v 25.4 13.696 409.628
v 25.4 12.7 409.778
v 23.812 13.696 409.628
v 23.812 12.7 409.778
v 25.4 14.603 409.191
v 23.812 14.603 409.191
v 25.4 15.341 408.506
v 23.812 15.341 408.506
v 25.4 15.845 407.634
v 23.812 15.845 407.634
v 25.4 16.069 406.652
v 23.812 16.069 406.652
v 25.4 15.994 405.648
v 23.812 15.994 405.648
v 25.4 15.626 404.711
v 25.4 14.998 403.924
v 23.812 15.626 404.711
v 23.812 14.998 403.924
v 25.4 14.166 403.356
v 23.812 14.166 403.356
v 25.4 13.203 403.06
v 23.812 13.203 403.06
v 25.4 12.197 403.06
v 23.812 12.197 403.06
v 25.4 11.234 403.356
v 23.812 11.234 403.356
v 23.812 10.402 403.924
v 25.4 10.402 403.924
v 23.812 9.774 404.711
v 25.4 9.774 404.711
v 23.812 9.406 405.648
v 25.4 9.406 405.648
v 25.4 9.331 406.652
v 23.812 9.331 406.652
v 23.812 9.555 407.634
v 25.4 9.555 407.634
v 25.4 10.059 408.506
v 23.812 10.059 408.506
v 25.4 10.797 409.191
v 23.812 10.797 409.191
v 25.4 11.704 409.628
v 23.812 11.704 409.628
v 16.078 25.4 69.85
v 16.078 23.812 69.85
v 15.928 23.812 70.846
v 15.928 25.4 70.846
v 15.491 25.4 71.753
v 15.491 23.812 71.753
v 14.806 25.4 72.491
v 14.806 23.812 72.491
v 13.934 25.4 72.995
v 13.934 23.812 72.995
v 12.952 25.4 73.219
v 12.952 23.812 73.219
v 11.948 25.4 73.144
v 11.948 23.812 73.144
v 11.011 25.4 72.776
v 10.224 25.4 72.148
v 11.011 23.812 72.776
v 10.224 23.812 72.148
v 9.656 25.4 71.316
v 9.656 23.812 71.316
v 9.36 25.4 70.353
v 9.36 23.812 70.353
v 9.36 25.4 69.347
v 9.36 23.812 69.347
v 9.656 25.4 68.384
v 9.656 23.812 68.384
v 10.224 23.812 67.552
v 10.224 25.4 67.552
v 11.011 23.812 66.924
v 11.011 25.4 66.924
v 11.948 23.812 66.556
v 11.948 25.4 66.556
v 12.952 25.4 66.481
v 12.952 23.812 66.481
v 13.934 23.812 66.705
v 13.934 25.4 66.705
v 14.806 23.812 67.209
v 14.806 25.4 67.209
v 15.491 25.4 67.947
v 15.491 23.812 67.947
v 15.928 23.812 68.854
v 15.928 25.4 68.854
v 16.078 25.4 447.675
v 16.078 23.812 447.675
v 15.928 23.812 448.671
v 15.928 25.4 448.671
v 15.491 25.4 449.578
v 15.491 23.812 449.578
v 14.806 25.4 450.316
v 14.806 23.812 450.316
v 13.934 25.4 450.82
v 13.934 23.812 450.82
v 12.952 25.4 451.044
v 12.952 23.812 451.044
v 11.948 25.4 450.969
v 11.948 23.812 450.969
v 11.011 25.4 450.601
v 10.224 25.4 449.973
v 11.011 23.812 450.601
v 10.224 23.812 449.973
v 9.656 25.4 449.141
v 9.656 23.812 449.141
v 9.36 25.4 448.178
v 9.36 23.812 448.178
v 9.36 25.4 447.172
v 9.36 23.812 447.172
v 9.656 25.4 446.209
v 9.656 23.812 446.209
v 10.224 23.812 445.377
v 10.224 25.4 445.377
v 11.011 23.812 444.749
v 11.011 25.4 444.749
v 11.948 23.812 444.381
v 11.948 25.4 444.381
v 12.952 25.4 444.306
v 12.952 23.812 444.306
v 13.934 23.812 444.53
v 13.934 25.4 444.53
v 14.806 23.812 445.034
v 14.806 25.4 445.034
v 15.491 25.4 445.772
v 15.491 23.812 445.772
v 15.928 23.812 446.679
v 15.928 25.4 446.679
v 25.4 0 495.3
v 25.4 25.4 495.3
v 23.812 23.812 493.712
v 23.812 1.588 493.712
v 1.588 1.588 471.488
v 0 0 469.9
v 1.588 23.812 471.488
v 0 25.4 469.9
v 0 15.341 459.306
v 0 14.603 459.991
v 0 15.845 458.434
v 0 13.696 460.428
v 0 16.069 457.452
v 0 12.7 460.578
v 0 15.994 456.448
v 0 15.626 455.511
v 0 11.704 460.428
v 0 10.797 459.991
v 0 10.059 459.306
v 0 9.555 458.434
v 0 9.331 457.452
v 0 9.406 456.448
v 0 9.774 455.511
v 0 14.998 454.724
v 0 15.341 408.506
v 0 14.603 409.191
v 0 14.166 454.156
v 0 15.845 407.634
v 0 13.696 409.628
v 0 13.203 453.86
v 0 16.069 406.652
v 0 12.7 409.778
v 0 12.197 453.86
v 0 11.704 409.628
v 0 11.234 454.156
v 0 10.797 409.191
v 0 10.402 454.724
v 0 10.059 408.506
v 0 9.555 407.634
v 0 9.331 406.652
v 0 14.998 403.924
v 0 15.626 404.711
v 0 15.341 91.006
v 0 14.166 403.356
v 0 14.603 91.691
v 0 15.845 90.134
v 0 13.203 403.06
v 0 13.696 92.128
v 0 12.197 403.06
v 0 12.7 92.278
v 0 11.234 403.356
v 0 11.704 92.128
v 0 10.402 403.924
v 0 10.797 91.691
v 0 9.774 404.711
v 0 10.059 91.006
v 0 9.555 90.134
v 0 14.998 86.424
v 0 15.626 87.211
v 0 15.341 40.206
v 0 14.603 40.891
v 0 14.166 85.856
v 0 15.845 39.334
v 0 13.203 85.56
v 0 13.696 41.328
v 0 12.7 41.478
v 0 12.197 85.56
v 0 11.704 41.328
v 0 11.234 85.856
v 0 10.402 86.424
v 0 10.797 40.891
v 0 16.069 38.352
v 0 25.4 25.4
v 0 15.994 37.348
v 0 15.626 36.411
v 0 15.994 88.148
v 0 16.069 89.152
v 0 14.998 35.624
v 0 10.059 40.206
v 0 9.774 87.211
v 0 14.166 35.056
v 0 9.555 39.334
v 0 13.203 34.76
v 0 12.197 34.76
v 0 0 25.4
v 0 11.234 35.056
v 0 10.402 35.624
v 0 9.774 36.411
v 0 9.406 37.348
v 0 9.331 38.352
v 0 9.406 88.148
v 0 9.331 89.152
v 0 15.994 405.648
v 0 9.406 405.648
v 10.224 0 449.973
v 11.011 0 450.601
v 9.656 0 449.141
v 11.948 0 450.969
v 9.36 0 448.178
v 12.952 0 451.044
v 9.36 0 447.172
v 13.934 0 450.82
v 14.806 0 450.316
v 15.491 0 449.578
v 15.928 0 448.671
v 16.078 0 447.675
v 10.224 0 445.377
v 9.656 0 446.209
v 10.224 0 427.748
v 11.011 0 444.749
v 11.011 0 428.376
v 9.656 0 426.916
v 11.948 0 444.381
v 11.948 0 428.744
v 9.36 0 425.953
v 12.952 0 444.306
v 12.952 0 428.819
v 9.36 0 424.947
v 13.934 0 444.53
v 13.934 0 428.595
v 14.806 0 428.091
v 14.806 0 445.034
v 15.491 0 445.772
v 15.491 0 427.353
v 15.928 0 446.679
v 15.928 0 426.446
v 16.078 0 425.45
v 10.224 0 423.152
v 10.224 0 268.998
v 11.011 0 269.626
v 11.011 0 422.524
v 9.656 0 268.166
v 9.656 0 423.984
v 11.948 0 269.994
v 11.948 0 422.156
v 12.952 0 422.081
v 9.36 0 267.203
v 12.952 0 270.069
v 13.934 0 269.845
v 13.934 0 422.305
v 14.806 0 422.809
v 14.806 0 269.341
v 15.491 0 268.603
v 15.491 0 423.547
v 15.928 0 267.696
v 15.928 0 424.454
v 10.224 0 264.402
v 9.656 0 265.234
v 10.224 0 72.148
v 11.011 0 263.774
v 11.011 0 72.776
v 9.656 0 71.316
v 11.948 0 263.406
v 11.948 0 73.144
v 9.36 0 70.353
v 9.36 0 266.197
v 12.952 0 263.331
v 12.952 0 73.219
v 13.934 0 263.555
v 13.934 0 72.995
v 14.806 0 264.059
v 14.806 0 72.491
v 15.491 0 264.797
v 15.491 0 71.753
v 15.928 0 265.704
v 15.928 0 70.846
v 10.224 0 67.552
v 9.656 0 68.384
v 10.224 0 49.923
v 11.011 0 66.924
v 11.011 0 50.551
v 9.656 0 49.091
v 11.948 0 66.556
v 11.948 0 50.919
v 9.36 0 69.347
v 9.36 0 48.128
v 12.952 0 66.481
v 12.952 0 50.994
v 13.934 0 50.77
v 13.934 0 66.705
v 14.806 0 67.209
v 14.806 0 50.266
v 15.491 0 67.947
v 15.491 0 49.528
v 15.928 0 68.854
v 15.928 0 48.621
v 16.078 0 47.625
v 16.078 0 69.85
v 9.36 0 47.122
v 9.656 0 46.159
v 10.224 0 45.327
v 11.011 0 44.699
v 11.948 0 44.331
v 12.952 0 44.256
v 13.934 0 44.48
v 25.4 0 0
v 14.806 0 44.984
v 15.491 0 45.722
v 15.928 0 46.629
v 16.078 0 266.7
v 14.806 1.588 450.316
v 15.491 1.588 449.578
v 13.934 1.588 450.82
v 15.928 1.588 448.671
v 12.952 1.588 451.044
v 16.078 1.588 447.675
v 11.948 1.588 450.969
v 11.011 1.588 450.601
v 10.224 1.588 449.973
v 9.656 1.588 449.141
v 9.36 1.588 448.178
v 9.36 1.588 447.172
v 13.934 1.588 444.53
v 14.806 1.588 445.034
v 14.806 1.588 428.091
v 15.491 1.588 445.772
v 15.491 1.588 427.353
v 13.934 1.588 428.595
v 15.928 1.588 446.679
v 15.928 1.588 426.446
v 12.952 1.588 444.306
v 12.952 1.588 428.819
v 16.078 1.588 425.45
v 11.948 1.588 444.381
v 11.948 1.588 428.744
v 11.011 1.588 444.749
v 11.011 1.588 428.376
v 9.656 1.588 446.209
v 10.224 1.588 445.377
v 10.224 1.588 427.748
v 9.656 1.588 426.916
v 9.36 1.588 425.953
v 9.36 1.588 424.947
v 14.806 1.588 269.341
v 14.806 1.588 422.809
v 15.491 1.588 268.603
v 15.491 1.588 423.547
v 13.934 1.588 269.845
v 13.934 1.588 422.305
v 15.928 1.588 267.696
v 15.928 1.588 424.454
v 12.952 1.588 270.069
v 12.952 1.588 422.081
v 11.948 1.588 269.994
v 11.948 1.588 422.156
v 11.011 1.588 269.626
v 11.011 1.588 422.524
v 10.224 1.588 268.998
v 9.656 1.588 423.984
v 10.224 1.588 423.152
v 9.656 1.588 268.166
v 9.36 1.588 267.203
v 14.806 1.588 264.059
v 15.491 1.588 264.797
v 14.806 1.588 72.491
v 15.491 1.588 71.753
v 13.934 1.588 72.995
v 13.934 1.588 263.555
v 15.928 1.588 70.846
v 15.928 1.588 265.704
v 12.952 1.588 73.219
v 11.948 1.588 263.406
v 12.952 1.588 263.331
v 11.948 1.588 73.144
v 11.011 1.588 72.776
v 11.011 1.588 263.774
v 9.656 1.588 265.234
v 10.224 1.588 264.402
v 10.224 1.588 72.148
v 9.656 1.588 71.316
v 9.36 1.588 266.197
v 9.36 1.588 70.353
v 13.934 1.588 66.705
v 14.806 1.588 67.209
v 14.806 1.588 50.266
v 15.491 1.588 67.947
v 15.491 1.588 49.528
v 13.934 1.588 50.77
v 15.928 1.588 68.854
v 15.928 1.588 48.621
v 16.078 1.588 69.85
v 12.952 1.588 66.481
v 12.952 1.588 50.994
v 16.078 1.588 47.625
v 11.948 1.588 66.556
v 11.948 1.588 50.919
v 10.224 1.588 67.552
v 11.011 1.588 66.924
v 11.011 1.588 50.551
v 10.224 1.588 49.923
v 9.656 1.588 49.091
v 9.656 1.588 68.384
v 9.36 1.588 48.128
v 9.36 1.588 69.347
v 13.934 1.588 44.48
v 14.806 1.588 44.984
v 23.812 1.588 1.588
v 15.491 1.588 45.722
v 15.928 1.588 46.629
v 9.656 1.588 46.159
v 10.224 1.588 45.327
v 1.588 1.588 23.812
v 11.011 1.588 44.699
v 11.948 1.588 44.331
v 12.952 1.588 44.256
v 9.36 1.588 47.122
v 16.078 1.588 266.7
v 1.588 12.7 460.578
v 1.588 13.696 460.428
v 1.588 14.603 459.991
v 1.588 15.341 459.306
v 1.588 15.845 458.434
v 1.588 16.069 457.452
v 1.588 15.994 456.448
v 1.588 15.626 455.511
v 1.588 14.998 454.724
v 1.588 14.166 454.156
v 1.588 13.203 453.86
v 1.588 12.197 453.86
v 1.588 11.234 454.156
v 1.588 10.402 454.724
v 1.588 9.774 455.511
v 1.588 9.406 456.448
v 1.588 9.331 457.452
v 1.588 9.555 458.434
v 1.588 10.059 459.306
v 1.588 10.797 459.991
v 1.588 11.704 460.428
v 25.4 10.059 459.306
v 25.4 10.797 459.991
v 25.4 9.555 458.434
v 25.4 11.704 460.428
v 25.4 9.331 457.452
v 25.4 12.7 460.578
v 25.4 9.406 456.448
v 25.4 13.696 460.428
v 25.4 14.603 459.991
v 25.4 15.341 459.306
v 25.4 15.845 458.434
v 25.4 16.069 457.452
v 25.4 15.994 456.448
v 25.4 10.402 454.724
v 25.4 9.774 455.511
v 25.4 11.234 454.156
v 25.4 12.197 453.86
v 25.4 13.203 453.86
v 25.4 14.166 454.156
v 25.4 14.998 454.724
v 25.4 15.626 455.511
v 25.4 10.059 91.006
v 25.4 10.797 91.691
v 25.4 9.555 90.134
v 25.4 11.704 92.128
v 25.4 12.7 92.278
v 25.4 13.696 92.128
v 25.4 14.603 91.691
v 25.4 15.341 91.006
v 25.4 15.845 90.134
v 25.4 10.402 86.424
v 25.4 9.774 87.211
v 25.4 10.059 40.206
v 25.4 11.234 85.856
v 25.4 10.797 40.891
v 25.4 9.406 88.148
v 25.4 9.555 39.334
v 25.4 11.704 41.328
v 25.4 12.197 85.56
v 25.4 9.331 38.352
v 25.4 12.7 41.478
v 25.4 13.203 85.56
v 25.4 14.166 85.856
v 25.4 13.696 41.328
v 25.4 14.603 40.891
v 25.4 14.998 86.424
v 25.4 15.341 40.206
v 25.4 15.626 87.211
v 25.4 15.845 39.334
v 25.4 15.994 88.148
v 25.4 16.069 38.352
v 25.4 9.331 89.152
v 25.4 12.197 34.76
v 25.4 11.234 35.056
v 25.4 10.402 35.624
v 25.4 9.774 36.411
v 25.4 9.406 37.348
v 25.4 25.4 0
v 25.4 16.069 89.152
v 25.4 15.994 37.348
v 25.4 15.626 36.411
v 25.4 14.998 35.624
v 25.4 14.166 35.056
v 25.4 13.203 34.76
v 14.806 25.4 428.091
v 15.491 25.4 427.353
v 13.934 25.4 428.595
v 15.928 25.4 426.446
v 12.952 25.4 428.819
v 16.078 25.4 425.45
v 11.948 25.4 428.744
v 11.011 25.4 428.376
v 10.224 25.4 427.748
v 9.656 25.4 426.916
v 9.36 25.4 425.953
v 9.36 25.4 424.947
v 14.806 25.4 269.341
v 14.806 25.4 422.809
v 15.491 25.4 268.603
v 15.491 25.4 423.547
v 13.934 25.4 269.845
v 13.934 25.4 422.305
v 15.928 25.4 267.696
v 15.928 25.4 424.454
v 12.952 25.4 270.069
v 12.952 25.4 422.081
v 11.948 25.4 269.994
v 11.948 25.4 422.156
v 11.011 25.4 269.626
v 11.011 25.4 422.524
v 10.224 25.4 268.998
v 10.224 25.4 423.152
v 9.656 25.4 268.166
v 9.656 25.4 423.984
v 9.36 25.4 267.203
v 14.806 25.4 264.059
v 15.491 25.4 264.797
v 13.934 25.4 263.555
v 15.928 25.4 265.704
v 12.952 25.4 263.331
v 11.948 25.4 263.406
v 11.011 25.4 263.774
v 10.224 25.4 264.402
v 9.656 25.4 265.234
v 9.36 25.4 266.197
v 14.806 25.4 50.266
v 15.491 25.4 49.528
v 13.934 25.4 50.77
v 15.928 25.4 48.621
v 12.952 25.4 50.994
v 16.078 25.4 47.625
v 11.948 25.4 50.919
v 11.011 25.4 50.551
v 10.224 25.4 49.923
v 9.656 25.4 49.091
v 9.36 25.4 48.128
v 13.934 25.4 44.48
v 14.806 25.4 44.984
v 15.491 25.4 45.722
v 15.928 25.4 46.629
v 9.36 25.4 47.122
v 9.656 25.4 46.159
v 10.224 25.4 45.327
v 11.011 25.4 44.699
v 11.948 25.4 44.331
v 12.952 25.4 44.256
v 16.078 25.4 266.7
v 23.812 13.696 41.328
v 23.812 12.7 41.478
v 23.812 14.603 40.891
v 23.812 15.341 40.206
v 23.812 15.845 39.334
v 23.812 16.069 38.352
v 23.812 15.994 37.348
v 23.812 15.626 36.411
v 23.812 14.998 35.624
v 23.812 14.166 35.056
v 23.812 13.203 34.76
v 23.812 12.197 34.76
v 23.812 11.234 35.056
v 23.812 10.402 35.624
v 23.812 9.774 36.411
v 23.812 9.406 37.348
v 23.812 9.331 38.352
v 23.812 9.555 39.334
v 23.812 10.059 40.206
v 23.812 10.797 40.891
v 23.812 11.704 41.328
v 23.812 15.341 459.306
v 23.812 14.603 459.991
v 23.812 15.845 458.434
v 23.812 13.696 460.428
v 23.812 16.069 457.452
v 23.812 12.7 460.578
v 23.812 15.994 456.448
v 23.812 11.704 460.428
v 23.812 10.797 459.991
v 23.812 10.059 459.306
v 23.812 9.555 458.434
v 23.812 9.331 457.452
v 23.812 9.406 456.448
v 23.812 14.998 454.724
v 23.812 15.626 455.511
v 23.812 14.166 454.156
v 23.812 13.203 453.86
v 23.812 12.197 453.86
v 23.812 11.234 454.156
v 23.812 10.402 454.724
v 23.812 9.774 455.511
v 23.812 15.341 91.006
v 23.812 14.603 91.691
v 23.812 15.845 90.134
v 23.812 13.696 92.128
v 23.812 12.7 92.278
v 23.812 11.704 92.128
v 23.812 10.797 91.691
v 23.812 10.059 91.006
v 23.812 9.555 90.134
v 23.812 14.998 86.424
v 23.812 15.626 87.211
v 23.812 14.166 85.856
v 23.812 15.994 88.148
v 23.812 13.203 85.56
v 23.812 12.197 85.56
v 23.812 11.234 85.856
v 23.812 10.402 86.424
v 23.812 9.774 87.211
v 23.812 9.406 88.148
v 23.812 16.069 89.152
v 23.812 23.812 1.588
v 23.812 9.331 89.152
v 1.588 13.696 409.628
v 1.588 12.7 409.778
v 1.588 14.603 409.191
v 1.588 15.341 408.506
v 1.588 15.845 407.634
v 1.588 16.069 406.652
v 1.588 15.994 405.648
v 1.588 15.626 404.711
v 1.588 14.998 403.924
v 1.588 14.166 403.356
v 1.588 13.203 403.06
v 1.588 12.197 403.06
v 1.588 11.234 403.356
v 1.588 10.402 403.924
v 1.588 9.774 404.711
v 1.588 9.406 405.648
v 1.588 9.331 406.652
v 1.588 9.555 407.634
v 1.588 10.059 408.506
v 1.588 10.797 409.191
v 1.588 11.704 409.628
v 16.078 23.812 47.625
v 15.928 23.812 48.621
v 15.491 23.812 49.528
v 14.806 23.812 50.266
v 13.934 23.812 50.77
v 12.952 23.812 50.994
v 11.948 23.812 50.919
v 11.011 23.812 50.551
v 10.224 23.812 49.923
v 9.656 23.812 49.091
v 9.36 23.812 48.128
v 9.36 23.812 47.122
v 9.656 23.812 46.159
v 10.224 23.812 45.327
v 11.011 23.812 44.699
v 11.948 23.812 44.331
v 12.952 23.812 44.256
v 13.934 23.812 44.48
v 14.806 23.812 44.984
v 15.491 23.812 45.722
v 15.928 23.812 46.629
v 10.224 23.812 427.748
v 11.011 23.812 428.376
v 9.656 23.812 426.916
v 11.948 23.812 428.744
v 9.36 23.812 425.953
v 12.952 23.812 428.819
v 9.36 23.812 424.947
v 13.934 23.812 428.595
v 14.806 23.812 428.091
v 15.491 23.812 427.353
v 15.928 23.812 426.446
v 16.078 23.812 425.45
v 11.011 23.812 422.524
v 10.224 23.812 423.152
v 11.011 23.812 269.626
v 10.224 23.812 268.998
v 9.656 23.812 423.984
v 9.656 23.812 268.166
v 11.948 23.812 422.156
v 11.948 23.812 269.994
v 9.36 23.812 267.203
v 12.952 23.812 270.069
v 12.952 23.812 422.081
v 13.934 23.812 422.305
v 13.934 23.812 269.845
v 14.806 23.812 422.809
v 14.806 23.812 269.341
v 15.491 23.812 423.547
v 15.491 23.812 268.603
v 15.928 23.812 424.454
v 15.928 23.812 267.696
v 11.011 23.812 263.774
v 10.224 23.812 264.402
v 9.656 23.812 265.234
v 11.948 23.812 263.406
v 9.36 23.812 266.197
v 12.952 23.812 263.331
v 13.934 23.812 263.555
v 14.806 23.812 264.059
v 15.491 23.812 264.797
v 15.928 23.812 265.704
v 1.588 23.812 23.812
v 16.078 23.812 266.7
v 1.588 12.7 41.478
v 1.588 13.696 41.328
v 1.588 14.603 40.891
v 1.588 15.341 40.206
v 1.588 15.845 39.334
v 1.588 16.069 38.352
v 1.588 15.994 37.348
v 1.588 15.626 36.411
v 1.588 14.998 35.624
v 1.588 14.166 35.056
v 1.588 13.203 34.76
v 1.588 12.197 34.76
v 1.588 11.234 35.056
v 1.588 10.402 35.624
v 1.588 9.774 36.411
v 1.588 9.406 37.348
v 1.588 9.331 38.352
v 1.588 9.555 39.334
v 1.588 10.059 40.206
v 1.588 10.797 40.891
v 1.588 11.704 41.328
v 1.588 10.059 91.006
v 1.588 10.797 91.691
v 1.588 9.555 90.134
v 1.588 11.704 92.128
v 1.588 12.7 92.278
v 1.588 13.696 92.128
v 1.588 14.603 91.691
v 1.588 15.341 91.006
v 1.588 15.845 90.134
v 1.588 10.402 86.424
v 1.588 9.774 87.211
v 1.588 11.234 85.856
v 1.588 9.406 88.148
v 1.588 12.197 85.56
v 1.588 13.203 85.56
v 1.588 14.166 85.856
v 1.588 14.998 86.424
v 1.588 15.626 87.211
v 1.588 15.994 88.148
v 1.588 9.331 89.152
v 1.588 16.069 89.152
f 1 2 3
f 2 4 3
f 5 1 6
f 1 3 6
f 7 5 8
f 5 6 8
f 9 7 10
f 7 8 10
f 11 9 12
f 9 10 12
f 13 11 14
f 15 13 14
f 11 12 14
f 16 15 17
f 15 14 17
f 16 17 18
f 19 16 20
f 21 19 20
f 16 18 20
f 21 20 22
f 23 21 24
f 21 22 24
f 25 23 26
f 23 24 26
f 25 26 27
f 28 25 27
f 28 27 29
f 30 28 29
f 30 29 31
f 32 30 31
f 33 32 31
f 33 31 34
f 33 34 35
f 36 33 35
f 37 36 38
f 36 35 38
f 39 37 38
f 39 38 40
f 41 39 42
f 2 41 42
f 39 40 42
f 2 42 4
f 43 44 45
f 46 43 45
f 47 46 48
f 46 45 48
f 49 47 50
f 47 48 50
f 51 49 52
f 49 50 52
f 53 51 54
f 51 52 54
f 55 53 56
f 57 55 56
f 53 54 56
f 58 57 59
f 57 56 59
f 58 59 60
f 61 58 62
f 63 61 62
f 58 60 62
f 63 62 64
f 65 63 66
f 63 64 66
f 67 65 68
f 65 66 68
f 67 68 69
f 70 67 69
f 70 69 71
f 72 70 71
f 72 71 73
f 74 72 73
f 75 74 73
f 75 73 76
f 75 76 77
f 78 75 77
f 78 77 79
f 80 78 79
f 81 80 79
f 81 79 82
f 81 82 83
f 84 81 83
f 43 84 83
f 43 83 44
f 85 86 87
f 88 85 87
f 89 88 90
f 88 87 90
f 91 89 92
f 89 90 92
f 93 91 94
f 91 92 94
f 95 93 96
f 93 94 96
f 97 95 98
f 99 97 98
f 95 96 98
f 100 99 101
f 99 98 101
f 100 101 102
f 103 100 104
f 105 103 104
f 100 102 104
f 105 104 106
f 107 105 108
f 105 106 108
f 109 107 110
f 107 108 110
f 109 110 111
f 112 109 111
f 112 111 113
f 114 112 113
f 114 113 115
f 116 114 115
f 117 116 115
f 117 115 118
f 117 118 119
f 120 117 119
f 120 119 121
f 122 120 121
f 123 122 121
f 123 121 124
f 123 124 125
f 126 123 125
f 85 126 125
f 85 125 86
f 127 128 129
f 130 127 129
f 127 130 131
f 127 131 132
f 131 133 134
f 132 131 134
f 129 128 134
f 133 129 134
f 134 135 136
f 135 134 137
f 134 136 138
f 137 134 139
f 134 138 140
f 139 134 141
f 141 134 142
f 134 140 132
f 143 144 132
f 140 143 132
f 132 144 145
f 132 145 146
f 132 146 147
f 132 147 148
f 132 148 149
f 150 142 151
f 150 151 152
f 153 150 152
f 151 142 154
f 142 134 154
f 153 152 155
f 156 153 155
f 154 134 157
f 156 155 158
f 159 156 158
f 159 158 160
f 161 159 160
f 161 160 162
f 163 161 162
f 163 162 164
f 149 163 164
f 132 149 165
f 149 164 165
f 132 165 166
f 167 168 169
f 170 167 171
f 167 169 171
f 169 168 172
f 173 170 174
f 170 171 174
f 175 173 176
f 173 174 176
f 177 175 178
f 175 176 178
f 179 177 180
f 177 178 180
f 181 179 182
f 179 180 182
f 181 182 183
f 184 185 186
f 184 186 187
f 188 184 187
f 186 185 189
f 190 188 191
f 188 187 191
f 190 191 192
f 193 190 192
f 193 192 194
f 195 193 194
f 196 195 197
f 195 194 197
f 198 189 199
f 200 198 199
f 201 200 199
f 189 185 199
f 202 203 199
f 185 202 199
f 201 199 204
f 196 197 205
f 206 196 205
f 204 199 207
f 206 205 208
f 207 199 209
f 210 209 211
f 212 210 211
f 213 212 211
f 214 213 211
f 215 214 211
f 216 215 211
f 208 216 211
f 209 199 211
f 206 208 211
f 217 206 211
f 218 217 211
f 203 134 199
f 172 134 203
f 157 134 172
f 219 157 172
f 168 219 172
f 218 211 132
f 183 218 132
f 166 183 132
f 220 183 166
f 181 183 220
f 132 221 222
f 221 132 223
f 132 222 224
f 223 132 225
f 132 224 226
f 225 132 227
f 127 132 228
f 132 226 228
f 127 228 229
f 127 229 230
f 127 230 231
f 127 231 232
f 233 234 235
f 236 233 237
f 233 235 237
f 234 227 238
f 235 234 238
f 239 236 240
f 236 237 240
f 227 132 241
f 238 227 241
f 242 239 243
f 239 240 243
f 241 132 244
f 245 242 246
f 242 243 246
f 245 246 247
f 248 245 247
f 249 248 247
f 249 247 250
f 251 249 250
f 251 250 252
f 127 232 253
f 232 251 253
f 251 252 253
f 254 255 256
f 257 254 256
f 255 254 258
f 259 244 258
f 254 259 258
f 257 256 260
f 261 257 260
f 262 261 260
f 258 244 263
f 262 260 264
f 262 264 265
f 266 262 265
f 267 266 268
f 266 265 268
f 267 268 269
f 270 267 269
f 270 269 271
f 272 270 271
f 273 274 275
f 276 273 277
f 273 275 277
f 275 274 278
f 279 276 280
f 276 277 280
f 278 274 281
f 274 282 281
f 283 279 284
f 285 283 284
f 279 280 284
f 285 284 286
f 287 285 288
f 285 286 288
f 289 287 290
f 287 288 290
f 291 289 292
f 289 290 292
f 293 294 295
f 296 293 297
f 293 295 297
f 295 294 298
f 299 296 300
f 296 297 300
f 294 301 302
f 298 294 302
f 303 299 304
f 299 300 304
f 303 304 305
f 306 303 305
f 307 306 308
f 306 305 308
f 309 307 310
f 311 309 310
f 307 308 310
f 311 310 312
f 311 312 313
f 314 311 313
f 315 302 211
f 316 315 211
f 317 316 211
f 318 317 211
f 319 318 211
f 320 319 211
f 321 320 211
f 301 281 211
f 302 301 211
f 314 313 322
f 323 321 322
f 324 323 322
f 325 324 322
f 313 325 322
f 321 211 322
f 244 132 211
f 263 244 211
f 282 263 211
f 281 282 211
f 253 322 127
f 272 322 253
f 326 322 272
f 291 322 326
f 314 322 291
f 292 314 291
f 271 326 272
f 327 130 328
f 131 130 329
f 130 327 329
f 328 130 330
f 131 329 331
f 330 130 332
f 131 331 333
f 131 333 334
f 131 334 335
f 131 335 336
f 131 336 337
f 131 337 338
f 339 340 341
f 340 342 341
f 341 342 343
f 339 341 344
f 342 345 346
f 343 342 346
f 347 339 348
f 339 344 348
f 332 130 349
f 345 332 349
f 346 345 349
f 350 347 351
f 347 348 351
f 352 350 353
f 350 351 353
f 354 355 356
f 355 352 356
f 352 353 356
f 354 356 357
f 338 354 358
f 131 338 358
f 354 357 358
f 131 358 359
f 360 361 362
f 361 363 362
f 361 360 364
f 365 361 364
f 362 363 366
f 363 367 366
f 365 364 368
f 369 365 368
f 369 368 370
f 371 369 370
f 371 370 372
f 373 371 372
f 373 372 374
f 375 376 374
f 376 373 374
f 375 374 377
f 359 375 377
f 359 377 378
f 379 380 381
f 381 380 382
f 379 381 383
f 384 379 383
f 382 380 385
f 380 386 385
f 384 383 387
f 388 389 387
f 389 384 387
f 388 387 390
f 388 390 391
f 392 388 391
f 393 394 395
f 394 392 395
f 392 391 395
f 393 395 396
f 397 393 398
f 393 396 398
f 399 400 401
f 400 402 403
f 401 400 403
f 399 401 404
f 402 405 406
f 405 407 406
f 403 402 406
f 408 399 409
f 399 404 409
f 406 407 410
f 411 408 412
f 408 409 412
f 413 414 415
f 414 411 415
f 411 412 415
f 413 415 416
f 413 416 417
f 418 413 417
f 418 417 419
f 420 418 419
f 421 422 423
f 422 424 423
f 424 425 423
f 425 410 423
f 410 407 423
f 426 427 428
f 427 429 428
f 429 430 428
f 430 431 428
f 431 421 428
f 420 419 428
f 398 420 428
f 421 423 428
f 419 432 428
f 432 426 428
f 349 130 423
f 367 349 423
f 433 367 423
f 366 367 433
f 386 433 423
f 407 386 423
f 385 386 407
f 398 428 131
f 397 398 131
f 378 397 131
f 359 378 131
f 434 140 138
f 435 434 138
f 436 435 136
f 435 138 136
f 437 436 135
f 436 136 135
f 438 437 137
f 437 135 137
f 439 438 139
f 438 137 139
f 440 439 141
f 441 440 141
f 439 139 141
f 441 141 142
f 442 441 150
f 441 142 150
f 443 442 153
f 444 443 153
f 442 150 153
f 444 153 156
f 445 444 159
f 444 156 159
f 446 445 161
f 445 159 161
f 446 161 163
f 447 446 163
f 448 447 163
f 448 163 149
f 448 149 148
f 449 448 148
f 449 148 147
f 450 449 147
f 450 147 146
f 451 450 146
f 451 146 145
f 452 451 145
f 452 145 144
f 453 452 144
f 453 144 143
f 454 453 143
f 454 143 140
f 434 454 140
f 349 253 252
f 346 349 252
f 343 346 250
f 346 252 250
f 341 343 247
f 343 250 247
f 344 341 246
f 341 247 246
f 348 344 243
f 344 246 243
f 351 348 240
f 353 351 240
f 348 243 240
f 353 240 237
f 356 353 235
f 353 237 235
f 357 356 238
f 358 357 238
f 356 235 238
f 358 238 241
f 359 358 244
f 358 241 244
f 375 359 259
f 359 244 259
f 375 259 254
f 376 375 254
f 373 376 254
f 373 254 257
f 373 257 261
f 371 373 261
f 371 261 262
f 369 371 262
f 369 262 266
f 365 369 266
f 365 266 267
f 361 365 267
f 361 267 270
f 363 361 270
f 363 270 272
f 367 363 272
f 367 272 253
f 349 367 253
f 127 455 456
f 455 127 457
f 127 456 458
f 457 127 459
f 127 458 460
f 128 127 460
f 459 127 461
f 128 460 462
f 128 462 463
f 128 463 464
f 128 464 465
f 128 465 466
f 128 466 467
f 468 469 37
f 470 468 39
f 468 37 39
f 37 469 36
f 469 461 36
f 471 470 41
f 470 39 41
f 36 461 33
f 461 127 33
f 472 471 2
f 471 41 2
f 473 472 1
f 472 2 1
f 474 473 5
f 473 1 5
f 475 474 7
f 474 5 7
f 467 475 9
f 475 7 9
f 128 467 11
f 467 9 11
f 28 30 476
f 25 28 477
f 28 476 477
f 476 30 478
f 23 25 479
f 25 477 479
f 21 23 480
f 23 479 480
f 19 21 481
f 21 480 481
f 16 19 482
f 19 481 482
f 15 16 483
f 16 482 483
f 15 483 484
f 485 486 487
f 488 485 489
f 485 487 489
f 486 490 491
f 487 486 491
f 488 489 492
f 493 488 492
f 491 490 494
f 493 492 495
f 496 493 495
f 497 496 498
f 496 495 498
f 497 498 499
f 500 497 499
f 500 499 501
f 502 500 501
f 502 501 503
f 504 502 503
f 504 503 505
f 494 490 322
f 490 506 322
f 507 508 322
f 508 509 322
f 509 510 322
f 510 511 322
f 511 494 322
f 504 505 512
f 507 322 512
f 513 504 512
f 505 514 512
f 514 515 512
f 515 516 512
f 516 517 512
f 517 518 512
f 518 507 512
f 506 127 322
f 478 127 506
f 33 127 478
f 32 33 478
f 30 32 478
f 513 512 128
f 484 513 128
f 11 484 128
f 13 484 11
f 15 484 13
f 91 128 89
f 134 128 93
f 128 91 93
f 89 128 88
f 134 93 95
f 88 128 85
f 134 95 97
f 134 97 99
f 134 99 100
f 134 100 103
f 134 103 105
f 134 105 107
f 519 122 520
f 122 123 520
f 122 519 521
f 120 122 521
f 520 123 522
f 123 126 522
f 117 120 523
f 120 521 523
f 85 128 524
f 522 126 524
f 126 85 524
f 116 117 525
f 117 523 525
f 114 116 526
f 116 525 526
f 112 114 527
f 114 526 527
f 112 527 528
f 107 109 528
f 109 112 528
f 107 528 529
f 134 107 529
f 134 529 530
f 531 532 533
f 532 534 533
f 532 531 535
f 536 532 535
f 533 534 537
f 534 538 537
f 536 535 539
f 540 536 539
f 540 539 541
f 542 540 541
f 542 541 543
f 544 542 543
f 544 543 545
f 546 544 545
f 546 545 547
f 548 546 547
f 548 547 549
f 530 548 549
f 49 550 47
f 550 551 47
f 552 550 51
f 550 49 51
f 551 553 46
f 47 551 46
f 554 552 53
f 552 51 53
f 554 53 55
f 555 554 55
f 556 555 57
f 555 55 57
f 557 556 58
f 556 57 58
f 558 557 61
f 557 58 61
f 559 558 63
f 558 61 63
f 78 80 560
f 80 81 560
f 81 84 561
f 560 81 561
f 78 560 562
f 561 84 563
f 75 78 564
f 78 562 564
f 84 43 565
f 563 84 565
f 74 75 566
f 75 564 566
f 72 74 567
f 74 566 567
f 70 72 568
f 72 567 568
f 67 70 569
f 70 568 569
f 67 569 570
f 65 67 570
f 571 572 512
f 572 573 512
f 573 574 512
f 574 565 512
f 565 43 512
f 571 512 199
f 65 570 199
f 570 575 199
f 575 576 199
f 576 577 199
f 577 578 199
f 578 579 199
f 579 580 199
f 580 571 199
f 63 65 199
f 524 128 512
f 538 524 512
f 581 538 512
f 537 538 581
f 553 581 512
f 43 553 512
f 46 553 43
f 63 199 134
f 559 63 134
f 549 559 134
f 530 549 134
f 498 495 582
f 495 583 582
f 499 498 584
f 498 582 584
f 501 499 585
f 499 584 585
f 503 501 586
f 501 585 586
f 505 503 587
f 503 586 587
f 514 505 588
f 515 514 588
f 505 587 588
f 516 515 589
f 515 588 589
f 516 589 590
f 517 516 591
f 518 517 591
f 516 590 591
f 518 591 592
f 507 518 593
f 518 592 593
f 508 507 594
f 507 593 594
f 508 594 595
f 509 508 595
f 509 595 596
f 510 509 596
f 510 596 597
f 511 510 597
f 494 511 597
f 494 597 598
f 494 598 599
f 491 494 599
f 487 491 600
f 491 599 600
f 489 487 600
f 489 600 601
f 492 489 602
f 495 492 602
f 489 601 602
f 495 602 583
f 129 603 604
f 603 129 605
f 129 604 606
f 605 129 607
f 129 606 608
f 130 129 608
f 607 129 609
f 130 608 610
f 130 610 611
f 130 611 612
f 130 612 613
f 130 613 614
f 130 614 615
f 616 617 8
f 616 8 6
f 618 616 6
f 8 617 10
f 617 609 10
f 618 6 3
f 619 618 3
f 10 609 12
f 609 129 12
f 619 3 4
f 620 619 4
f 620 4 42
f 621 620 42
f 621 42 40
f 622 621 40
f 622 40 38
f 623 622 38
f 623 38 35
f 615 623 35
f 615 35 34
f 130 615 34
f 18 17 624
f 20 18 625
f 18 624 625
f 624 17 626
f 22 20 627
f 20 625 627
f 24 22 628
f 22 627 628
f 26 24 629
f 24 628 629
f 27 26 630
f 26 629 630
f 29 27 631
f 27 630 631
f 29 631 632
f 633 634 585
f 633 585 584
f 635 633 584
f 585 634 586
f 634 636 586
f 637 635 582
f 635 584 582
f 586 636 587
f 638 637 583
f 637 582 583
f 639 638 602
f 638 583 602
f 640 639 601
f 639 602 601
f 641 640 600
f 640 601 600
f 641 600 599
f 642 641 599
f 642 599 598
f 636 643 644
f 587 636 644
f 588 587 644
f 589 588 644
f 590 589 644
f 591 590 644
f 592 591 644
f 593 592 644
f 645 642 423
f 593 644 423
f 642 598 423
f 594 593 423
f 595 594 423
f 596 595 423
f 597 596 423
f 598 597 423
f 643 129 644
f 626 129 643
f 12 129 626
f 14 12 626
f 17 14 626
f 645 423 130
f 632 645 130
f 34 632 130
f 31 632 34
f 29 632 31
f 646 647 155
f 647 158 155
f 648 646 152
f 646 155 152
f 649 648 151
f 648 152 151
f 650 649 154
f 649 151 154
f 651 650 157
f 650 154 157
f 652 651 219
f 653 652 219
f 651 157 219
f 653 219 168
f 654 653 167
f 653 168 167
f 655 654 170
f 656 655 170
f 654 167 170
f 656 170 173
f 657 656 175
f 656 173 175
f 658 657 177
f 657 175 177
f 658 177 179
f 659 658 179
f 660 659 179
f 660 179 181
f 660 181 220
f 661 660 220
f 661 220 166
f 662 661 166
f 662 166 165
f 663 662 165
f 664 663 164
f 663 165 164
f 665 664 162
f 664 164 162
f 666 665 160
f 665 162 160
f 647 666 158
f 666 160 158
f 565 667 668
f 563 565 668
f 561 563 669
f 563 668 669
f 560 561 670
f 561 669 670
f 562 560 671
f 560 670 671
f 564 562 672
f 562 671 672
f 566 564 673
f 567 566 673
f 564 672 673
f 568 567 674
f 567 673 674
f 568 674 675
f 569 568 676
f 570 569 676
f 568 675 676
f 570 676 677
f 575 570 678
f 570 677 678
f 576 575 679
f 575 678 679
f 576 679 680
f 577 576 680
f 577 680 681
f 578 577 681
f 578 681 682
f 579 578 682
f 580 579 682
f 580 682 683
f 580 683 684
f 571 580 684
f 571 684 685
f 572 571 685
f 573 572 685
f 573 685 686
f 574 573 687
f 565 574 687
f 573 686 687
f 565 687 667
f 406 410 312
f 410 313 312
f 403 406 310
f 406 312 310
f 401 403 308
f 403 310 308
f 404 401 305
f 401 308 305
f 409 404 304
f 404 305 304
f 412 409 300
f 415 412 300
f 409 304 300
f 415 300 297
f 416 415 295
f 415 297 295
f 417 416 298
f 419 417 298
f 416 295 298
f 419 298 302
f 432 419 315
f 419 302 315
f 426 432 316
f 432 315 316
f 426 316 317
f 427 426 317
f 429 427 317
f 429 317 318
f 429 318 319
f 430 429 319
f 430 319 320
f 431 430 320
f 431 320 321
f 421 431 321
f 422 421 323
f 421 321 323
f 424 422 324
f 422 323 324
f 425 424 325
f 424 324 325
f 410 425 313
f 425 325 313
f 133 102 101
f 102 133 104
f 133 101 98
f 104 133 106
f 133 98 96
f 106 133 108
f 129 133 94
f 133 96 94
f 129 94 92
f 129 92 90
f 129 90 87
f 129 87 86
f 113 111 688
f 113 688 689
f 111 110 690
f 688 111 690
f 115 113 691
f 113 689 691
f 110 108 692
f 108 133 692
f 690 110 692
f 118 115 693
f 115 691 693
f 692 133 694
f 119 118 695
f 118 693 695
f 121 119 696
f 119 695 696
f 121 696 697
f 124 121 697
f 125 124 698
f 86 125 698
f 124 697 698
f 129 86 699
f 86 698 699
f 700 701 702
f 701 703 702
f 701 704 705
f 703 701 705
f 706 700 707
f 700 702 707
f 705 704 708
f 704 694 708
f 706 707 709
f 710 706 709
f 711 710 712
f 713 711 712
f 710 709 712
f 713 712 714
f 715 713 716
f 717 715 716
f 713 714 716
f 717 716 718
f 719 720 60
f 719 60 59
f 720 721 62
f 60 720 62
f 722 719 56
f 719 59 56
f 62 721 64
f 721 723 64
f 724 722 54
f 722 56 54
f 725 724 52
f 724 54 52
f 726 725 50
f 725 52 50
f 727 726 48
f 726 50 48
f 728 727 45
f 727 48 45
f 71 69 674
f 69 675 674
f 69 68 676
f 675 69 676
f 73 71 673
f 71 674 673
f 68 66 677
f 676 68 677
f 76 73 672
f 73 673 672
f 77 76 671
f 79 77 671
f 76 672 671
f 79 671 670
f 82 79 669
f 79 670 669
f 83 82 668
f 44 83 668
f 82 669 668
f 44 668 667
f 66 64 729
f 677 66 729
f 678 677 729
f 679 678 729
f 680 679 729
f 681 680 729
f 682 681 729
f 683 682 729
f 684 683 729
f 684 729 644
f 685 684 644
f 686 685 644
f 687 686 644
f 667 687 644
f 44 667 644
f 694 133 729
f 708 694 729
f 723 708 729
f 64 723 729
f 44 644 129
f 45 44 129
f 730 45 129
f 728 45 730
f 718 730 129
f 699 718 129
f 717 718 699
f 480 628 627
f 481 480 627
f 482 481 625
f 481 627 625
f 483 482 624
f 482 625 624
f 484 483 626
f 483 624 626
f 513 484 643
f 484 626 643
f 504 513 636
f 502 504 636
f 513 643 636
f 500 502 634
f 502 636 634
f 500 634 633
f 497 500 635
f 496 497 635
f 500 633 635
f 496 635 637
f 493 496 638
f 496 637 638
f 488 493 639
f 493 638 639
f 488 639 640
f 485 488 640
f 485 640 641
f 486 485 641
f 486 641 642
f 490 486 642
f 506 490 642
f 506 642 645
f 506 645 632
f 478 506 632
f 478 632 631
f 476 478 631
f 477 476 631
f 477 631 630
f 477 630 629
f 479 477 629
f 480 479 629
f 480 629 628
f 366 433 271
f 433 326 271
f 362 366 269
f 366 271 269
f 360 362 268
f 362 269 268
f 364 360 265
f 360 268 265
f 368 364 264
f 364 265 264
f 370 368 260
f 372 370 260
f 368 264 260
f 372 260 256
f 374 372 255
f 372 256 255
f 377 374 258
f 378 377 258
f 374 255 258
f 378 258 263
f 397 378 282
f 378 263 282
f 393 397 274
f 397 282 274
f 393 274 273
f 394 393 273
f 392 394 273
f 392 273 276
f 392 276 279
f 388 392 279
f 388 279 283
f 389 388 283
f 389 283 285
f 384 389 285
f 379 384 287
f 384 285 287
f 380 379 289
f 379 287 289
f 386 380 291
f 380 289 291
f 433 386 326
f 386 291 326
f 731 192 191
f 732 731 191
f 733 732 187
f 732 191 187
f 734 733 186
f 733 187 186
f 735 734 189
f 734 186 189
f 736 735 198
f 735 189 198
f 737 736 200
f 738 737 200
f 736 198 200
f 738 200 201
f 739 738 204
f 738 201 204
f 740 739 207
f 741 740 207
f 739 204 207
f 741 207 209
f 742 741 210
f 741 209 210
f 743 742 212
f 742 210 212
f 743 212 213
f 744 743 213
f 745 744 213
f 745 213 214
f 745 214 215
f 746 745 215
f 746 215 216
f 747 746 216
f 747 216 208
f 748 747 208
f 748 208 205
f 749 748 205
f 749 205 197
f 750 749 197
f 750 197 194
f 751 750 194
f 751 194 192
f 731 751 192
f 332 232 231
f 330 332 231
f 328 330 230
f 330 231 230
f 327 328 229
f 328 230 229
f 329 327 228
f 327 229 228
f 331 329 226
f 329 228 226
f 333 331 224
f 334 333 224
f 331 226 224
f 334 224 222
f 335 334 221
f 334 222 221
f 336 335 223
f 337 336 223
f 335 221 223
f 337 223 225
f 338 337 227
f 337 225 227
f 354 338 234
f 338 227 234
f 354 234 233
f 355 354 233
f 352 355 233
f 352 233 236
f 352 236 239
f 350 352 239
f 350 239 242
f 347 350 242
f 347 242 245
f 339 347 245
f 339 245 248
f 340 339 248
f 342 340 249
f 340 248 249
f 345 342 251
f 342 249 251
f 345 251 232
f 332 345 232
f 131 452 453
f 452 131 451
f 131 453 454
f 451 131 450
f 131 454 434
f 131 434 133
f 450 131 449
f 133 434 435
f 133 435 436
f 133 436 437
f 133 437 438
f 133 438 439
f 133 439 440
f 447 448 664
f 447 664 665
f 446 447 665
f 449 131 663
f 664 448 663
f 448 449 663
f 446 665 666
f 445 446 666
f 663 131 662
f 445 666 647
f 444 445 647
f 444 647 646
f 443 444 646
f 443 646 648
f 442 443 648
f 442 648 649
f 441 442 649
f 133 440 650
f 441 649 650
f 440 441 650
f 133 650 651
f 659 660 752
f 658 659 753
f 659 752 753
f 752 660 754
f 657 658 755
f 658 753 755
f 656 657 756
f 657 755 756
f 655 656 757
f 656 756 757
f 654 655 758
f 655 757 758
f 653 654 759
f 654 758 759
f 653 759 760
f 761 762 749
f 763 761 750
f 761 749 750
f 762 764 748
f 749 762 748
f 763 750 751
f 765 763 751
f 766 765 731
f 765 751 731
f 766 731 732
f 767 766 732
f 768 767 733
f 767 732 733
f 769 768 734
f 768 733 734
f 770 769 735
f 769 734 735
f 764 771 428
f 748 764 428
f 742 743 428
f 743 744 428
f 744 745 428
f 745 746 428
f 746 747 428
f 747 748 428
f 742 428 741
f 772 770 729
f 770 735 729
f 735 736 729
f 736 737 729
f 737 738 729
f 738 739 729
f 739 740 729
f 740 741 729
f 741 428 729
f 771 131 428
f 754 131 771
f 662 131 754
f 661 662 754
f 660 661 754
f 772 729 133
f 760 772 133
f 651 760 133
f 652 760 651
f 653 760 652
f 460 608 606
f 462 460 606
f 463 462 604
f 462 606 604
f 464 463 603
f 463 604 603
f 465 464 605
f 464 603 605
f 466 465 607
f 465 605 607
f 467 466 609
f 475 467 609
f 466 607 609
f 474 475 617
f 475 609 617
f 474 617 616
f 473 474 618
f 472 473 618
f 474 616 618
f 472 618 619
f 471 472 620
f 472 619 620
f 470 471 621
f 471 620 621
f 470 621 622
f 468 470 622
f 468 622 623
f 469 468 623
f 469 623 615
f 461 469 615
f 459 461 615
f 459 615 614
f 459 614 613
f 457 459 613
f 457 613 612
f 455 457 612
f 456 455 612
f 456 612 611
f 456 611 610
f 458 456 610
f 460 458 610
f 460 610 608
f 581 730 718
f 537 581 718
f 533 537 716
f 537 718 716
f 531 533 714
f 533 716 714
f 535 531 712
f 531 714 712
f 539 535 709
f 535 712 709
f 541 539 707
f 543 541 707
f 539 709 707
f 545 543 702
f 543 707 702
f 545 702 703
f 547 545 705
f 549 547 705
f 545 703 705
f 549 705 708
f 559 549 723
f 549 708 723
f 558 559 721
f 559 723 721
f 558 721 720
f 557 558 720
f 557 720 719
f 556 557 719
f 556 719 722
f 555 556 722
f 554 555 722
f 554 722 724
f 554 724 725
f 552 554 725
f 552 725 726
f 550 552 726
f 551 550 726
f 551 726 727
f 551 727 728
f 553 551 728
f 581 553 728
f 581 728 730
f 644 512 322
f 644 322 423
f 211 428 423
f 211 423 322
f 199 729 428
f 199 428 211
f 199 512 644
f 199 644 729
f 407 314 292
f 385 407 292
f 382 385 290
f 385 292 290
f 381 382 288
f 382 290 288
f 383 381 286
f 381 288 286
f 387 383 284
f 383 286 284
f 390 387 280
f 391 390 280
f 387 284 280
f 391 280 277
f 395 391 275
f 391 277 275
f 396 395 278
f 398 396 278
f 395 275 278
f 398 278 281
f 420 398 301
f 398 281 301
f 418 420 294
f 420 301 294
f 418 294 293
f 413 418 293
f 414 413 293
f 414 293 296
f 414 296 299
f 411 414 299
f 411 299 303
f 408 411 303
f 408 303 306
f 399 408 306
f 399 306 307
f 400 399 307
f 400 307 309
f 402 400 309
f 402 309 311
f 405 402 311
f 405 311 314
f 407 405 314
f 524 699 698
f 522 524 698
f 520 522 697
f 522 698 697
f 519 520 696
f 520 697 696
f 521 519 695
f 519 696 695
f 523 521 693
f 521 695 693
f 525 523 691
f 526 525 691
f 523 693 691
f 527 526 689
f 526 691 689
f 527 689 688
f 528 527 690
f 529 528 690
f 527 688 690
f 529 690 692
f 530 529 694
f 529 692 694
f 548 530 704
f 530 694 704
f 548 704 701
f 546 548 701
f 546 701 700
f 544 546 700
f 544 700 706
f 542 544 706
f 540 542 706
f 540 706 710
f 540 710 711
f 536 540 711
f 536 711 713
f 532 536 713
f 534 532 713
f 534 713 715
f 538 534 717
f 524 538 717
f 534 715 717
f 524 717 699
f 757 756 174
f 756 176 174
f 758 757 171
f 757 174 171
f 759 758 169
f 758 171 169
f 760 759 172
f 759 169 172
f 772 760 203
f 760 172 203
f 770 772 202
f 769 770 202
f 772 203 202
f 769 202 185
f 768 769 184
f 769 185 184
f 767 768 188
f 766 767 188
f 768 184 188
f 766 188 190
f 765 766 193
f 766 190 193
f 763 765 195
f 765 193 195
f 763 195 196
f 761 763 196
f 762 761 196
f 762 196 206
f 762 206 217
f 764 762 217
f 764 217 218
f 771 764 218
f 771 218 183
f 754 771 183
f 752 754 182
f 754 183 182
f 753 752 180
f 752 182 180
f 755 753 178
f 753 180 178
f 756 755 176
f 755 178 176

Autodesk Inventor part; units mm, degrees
ref_plane "YZ Plane" through (0, 0, 0) normal (1, 0, 0) x (0, 1, 0)
ref_plane "XZ Plane" through (0, 0, 0) normal (0, 1, 0) x (-1, 0, 0)
ref_plane "XY Plane" through (0, 0, 0) normal (0, 0, 1) x (1, 0, 0)
sketch "Sketch1" plane through (0, 0, 0) normal (0, 0, 1) x (1, 0, 0)
  line L0 (0, 0) -> (25.4, 0)
  line L1 (25.4, 0) -> (25.4, 25.4)
  line L2 (25.4, 25.4) -> (0, 25.4)
  line L3 (0, 25.4) -> (0, 0)
  line L4 (1.5875, 23.8125) -> (23.8125, 23.8125)
  line L5 (23.8125, 23.8125) -> (23.8125, 1.5875)
  line L6 (23.8125, 1.5875) -> (1.5875, 1.5875)
  line L7 (1.5875, 1.5875) -> (1.5875, 23.8125)
  dimension "d0" = 25.4
  dimension "d2" = 25.4
  dimension "d3" = 1.5875
extrude "Extrusion1" add sketch "Sketch1" along normal blind 495.3
sketch "Sketch2" plane through (0, 25.4, 0) normal (0, 1, 0) x (1, 0, 0)
  line L0 (25.4, 0) -> (0, 0) projected
  line L1 (0, 0) -> (0, -495.3) projected
  line L2 (25.4, -495.3) -> (0, -495.3) projected
  line L3 (25.4, 0) -> (25.4, -495.3) projected
  line L4 (25.4, -495.3) -> (0, -469.9)
  line L5 (25.4, 0) -> (0, -25.4)
  dimension "d6" = 135
  dimension "d7" = 45
extrude "Extrusion2" cut sketch "Sketch2" against normal blind 495.3 contours L5 L1 L0 | L2 L1 L4
sketch "Sketch3" plane through (25.4, 0, 0) normal (0, -1, 0) x (1, 0, 0)
  circle A0 centre (-12.7, 69.85) radius 3.3782 projected
  circle A1 centre (-12.7, 47.625) radius 3.3782 projected
  circle A2 centre (-12.7, 425.45) radius 3.3782 projected
  circle A3 centre (-12.7, 447.675) radius 3.3782 projected
  circle A4 centre (-12.7, 266.7) radius 3.3782 projected
  line L0 (-23.1775, 257.9688) -> (-23.1775, 275.4313) projected
  line L1 (-6.35, 257.9688) -> (-23.1775, 257.9688) projected
  line L2 (-6.35, 275.4313) -> (-6.35, 257.9688) projected
  line L3 (-6.35, 275.4313) -> (-23.1775, 275.4313) projected
  point P0 (-25.4, 0)
extrude "Extrusion3" cut sketch "Sketch3" against normal blind 25.4 contours A0 | A1 | A2 | A3 | A4
sketch "Sketch4" plane through (0, 0, 25.4) normal (-1, 0, 0) x (0, 0, 1)
  circle A0 centre (431.8, 12.7) radius 3.3782 projected
  circle A1 centre (381, 12.7) radius 3.3782 projected
  circle A2 centre (12.7, 12.7) radius 3.3782 projected
  circle A3 centre (63.5, 12.7) radius 3.3782 projected
  point P0 (-25.4, 0)
extrude "Extrusion4" cut sketch "Sketch4" against normal blind 25.4
properties part number "Rebuild Shooter Tower Top Tube 2" material "Aluminum 6061"
